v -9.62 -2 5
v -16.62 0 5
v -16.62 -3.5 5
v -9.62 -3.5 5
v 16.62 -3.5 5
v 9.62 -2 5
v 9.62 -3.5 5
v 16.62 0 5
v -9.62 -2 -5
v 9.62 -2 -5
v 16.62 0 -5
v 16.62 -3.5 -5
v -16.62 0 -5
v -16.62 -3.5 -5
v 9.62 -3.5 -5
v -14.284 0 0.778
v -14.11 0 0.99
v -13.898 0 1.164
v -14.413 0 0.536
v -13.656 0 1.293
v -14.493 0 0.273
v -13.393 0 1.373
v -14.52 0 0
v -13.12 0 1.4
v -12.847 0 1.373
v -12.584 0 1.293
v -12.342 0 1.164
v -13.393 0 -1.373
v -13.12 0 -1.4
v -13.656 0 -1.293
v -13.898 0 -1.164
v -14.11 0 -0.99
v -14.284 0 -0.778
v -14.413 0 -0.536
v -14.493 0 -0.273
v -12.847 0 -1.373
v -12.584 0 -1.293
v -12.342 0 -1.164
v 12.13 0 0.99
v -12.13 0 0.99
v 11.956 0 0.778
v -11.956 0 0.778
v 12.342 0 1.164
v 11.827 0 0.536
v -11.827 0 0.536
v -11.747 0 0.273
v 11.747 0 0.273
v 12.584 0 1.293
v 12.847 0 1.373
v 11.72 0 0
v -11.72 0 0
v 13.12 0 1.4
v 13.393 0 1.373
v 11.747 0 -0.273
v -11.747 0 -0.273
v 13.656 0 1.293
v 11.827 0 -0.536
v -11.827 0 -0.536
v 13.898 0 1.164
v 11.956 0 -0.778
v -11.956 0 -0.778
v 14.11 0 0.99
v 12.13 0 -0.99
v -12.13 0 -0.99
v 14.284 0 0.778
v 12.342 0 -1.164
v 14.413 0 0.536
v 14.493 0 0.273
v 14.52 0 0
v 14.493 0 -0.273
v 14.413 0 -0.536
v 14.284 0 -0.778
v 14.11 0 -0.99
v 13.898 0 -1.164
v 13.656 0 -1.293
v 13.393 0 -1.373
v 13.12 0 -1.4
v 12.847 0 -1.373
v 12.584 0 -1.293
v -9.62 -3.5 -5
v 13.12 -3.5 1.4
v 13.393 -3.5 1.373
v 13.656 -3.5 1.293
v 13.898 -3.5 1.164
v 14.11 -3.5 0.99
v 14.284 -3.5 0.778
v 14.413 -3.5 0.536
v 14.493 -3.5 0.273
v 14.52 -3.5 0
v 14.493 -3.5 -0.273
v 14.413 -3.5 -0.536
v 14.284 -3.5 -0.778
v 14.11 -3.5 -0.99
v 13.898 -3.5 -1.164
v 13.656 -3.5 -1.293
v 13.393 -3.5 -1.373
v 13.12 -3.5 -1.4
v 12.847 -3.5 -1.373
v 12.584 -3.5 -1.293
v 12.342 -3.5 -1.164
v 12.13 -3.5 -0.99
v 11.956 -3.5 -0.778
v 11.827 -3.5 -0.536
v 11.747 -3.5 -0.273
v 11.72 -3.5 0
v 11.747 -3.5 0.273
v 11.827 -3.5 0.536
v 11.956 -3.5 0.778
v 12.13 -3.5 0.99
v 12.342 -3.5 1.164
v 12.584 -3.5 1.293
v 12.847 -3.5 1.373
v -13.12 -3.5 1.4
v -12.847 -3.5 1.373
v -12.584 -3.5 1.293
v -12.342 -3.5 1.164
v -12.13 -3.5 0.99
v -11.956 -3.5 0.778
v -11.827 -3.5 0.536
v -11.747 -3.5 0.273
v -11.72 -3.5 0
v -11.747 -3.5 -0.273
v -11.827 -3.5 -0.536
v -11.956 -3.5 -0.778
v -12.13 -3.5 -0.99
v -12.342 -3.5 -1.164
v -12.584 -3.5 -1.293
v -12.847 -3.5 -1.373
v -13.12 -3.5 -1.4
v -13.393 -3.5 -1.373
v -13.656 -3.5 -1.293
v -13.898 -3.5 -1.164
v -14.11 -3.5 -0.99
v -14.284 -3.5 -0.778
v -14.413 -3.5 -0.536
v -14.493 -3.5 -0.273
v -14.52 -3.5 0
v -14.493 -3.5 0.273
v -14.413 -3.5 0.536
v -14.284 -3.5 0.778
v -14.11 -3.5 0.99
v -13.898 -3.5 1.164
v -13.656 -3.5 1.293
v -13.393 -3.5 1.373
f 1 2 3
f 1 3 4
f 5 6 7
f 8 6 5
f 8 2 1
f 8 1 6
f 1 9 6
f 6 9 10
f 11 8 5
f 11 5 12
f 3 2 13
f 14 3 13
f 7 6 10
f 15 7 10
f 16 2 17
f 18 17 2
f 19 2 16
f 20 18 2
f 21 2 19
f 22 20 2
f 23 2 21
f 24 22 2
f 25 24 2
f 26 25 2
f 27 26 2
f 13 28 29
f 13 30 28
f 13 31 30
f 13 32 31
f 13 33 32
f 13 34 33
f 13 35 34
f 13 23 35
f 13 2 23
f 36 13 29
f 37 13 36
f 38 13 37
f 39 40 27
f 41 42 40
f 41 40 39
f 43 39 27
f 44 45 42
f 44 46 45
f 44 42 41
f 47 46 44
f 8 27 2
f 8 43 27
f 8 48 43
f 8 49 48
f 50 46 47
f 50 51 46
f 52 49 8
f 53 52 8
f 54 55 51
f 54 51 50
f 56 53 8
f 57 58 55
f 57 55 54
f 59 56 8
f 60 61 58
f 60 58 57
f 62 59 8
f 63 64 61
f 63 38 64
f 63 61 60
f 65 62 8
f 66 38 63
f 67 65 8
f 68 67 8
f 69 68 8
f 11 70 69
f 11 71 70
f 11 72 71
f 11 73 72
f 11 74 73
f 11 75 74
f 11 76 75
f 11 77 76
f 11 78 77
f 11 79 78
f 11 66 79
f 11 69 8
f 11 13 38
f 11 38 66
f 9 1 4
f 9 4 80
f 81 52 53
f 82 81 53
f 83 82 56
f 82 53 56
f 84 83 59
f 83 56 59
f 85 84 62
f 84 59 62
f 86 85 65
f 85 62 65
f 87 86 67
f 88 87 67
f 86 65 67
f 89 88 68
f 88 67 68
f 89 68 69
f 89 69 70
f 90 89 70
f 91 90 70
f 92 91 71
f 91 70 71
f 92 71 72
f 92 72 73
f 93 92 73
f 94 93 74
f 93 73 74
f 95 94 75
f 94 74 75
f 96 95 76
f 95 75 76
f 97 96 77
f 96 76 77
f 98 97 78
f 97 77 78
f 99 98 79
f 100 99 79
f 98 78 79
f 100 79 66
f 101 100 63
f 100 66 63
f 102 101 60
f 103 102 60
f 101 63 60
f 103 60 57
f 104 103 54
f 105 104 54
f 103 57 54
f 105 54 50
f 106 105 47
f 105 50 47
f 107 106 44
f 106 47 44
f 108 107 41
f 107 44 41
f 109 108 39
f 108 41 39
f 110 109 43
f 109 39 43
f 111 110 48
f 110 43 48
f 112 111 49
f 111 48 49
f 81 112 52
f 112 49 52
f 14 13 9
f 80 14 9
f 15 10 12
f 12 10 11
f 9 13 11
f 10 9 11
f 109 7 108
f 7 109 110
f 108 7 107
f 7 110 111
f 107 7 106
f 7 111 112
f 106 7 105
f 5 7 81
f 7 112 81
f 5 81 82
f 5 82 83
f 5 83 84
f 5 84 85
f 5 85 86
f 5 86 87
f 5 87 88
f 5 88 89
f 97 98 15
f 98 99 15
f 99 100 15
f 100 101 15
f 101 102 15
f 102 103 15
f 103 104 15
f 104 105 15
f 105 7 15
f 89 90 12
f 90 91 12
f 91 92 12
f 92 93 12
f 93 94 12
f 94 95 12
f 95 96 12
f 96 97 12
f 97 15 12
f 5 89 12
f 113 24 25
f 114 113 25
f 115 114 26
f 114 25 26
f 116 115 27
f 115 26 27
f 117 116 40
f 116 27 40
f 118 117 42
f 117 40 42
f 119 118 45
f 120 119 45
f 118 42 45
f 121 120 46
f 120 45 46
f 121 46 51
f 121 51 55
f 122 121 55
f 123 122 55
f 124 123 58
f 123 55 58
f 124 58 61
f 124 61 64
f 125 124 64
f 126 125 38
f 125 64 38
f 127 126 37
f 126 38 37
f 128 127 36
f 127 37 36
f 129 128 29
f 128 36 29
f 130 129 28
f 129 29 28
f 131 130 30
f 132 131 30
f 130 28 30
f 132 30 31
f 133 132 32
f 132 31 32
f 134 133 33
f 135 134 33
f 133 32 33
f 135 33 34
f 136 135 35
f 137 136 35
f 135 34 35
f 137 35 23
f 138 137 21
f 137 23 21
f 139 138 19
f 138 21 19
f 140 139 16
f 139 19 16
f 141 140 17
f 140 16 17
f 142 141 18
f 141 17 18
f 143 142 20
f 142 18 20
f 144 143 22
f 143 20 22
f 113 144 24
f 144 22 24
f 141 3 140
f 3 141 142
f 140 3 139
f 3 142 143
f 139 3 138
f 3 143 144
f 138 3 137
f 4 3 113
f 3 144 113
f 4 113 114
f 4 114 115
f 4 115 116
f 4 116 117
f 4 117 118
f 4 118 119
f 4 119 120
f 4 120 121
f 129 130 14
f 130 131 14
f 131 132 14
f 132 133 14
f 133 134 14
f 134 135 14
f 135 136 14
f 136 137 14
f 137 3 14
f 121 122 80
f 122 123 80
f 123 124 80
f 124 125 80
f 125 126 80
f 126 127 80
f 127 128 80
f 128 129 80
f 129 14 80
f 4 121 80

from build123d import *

# Parameters (mm, degrees)
SKETCH1_W             = 7
SKETCH1_H             = 10
SKETCH1_R             = 1.4
BOSS_EXTRUDE1_DEPTH   = 3.5
BOSS_EXTRUDE1_2_DEPTH = 3.5
SKETCH1_3_W           = 19.24
SKETCH1_3_H           = 10
BOSS_EXTRUDE2_DEPTH   = 2


with BuildPart() as part:
    # Sketch1 → Boss-Extrude1 (new body)
    with BuildSketch(Plane(origin=(0, 0, 0), x_dir=(1, 0, 0), z_dir=(0, 1, 0))):
        with Locations((-13.12, 0)):
            Rectangle(SKETCH1_W, SKETCH1_H)
        with Locations((-13.12, 0)):
            Circle(SKETCH1_R, mode=Mode.SUBTRACT)
    extrude(amount=-BOSS_EXTRUDE1_DEPTH)



with BuildPart() as body_2:
    # Sketch1 → Boss-Extrude1 2 (new body)
    with BuildSketch(Plane(origin=(0, 0, 0), x_dir=(1, 0, 0), z_dir=(0, 1, 0))):
        with Locations((13.12, 0)):
            Rectangle(SKETCH1_W, SKETCH1_H)
        with Locations((13.12, 0)):
            Circle(SKETCH1_R, mode=Mode.SUBTRACT)
    extrude(amount=-BOSS_EXTRUDE1_2_DEPTH)


with BuildPart() as part_1:
    add(part.part)

    add(body_2.part)  # Boss-Extrude2 merges body 2
    # Sketch1<3> → Boss-Extrude2 (add)
    with BuildSketch(Plane(origin=(0, 0, 0), x_dir=(1, 0, 0), z_dir=(0, 1, 0))):
        Rectangle(SKETCH1_3_W, SKETCH1_3_H)
    extrude(amount=-BOSS_EXTRUDE2_DEPTH)


solid = part_1.part
